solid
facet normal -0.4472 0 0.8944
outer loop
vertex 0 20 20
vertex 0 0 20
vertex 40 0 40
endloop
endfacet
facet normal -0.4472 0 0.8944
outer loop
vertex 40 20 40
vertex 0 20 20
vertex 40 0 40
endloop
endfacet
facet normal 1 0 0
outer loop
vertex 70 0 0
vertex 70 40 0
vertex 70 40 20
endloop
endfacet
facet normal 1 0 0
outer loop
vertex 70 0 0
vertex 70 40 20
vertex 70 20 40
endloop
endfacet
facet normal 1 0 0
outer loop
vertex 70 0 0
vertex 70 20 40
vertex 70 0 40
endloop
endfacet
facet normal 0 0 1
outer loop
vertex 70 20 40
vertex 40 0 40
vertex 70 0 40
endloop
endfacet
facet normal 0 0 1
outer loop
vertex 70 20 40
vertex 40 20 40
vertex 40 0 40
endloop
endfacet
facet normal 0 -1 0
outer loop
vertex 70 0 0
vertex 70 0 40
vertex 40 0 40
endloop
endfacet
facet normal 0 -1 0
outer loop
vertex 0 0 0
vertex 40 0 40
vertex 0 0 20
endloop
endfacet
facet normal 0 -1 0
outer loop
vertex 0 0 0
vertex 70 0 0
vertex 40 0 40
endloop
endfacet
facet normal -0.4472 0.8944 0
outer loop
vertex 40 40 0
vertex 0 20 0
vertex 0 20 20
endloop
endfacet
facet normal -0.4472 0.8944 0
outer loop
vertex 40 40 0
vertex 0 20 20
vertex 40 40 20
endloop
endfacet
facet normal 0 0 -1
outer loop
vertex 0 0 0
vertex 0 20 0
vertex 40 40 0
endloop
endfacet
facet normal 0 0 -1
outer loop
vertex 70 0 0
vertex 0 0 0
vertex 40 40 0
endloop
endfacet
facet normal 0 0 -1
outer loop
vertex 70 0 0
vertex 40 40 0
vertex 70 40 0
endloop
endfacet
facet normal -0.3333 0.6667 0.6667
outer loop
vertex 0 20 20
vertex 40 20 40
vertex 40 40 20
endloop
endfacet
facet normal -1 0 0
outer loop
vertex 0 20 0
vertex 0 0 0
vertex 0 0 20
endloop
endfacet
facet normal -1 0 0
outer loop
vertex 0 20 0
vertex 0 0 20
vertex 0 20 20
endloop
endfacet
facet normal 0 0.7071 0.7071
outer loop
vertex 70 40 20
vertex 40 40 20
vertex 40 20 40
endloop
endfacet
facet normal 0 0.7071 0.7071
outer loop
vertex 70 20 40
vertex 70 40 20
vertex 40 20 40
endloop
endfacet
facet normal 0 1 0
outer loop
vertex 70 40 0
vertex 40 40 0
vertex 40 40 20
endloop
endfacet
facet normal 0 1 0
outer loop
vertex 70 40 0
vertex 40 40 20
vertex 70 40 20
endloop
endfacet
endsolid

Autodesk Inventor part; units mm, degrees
ref_plane "YZ Plane" through (0, 0, 0) normal (1, 0, 0) x (0, 1, 0)
ref_plane "XZ Plane" through (0, 0, 0) normal (0, 1, 0) x (-1, 0, 0)
ref_plane "XY Plane" through (0, 0, 0) normal (0, 0, 1) x (1, 0, 0)
sketch "Sketch1" plane through (0, 0, 0) normal (0, 0, 1) x (1, 0, 0)
  line L0 (0, 0) -> (0, 20)
  line L1 (0, 20) -> (40, 40)
  line L2 (40, 40) -> (70, 40)
  line L3 (70, 40) -> (70, 0)
  line L4 (70, 0) -> (0, 0)
  dimension "d0" = 70
  dimension "d1" = 40
  dimension "d2" = 20
  dimension "d3" = 30
extrude "Extrusion1" add sketch "Sketch1" along normal blind 40
sketch "Sketch2" plane through (0, 0, 0) normal (0, -1, 0) x (1, 0, 0)
  line L0 (0, 40) -> (70, 40) projected
  line L1 (0, 0) -> (0, 40) projected
  line L2 (0, 0) -> (0, 40) projected
  line L3 (0, 20) -> (40, 40)
extrude "Extrusion2" cut sketch "Sketch2" against normal through all
sketch "Sketch3" plane through (70, 0, 0) normal (1, 0, 0) x (0, 0, -1)
  line L0 (0, 40) -> (-40, 40) projected
  line L1 (-40, 0) -> (-40, 40) projected
  line L2 (-20, 40) -> (-40, 20)
extrude "Extrusion3" cut sketch "Sketch3" against normal through all
sketch "Sketch4" plane through (40, 20, 40) normal (0, 0.7071, 0.7071) x (1, 0, 0)
  line L0 (-20, 14.1421) -> (0, 28.2843) projected
  line L1 (0, 0) -> (-20, 14.1421) projected
  line L2 (0, 28.2843) -> (0, 0)
  point P0 (-40, 14.1421)
sketch "Sketch5" plane through (0, 20, 20) normal (-0.4472, 0.8944, 0) x (0.8944, 0.4472, 0)
  line L0 (-8.9443, 0) -> (0, 0) projected
  line L1 (44.7214, 0) -> (0, 0)
  point P0 (-8.9443, 20)
sweep "Sweep1" cut profiles "Sketch4" path "Sketch5" path curves L1
properties part number "B7"
